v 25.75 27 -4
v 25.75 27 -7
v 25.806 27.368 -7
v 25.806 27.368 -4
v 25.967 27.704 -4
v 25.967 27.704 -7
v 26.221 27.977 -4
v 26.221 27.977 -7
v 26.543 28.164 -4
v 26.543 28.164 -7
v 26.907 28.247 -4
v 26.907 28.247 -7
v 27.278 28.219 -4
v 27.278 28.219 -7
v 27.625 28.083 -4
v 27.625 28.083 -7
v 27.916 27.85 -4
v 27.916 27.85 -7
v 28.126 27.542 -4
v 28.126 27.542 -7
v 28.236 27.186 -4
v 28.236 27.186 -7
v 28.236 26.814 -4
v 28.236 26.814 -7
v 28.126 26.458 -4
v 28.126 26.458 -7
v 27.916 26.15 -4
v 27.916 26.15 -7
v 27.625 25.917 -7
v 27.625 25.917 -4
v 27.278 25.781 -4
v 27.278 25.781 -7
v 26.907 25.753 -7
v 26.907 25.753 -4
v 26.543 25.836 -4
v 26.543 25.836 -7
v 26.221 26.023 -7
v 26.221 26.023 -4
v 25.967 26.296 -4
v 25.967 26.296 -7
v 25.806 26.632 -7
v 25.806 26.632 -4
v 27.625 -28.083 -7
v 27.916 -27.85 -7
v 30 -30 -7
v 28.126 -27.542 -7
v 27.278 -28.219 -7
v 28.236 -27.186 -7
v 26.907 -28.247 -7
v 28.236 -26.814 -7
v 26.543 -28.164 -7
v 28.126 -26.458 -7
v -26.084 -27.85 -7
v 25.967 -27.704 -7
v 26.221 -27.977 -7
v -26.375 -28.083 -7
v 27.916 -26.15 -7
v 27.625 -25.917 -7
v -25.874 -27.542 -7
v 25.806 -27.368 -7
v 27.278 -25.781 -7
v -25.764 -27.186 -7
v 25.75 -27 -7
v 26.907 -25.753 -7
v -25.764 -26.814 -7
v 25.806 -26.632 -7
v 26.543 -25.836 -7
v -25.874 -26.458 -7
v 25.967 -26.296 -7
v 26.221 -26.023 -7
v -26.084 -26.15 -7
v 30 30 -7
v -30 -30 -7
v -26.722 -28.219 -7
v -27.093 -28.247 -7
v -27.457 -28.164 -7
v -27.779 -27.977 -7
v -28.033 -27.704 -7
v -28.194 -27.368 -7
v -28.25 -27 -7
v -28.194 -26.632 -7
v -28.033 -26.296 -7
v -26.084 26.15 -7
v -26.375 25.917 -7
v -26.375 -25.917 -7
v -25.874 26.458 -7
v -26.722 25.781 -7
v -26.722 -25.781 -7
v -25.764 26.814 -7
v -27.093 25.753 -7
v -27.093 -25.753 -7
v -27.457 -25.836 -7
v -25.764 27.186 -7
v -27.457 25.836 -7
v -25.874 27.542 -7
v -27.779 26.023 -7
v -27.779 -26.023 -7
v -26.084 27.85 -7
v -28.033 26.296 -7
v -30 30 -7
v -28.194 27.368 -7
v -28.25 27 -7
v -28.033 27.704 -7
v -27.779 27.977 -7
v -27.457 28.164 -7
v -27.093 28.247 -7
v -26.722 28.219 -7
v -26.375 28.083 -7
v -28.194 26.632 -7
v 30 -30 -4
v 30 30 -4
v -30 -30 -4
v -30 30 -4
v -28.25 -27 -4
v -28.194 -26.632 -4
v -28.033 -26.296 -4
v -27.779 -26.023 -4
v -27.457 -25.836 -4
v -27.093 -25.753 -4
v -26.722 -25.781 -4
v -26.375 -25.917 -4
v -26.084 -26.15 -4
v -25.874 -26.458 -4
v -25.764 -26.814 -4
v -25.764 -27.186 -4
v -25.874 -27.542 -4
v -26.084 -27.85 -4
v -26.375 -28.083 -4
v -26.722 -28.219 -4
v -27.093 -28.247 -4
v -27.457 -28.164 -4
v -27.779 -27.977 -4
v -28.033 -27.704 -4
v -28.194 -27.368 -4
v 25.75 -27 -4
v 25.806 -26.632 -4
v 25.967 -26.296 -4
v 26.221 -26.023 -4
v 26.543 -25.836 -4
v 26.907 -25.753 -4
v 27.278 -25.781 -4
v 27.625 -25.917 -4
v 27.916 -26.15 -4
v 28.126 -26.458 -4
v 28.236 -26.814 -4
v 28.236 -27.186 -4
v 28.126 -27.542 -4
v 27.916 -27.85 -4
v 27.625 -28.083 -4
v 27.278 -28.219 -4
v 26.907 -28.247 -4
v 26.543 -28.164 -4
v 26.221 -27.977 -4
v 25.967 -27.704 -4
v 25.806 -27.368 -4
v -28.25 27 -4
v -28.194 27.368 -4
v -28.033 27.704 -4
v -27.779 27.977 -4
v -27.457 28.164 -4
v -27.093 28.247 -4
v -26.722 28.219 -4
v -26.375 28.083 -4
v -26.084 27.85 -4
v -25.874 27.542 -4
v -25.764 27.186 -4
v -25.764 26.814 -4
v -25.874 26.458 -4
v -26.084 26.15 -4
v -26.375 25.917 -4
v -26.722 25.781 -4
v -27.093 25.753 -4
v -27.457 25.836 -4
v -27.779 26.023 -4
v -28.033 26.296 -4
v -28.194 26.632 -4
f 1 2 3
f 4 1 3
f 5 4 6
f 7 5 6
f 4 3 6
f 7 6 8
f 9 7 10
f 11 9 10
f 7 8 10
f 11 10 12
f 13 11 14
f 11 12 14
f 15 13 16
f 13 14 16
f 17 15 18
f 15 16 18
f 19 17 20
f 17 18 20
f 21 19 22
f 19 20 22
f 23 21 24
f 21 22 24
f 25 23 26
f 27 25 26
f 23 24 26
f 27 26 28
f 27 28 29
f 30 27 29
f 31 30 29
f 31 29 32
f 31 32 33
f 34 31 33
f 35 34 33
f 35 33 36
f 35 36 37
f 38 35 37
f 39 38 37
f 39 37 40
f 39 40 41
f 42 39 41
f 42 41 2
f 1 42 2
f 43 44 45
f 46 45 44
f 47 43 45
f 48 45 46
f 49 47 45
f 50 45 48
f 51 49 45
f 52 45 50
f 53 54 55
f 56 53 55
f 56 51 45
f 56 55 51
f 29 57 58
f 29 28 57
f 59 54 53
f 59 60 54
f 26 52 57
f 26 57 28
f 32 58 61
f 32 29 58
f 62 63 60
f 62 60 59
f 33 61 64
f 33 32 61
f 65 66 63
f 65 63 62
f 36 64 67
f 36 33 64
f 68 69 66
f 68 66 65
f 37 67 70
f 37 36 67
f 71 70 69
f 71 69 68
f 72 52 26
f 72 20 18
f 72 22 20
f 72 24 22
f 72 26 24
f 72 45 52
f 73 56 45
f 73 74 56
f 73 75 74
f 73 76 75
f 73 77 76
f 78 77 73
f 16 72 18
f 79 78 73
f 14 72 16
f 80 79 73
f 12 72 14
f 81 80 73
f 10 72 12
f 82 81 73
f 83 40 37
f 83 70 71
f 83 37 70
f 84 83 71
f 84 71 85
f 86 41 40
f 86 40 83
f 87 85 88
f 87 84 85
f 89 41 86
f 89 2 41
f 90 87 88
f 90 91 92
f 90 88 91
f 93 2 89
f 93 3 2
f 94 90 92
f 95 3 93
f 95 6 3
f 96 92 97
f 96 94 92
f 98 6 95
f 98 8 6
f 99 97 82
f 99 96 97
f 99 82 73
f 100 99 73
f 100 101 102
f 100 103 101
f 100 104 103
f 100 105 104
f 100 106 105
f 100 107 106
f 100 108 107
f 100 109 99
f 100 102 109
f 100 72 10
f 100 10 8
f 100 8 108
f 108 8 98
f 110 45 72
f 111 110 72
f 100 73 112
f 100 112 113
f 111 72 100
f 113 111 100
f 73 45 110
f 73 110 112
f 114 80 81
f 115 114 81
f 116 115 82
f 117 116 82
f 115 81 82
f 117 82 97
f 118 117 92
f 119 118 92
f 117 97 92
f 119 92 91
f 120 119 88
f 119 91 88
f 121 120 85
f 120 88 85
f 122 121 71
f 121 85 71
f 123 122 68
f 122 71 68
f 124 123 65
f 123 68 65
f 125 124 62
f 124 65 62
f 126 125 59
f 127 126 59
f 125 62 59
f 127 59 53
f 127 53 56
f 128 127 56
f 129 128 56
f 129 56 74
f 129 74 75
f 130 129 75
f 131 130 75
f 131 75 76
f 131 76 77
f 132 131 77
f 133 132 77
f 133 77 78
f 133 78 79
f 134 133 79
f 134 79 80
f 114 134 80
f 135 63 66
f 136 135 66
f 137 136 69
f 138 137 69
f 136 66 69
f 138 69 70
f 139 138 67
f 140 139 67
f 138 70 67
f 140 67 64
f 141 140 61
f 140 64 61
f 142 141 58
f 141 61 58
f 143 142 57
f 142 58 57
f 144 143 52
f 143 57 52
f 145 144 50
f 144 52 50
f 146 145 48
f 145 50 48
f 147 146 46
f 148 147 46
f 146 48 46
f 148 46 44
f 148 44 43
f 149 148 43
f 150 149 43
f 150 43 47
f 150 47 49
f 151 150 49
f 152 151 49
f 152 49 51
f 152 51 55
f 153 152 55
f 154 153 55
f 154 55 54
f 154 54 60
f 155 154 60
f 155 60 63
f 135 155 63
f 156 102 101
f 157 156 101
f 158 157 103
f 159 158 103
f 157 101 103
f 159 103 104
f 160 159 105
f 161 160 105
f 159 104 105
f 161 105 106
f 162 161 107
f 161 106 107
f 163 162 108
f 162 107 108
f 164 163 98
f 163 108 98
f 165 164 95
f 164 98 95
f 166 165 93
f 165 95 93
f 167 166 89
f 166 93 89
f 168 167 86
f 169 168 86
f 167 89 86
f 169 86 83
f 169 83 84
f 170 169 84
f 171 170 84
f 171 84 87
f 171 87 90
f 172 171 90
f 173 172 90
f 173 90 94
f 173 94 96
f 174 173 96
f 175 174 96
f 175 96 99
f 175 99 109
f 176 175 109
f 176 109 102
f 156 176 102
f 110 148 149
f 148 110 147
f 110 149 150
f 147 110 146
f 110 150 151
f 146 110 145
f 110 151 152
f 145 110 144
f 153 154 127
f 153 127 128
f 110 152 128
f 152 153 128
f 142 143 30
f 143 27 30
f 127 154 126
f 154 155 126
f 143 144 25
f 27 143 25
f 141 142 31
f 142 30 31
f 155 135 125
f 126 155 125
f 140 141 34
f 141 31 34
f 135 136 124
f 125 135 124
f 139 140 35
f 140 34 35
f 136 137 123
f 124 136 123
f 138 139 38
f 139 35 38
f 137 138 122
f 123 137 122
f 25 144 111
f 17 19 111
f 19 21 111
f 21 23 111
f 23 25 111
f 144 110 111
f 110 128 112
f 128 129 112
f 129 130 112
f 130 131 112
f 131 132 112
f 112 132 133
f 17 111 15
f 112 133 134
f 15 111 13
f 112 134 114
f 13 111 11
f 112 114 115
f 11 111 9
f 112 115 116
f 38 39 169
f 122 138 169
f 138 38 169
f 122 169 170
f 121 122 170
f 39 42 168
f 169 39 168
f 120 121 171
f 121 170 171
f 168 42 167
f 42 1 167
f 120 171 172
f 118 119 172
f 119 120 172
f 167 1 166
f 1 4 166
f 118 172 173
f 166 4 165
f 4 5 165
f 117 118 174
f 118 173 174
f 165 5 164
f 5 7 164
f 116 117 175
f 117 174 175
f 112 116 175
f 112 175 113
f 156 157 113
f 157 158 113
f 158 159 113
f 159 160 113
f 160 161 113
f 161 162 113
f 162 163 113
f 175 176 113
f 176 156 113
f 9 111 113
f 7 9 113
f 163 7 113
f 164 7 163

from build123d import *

# Parameters (mm, degrees)
SKETCH1_W                  = 60
SKETCH1_H                  = 60
BOSS_EXTRUDE1_DEPTH        = 3
F_2_5_2_5_DIAMETER_HOLE1_D = 2.5


with BuildPart() as part:
    # Sketch1 → Boss-Extrude1 (new body)
    with BuildSketch(Plane(origin=(0, 0, -7), x_dir=(-1, 0, 0), z_dir=(0, 0, -1))):
        Rectangle(SKETCH1_W, SKETCH1_H)
    extrude(amount=-BOSS_EXTRUDE1_DEPTH)

    # Ø2.5 (2.5) Diameter Hole1 (through all)
    with Locations(Plane.XY.offset(-4)):
        with Locations((-27, 27), (-27, -27), (27, -27), (27, 27)):
            Hole(F_2_5_2_5_DIAMETER_HOLE1_D / 2)


solid = part.part
